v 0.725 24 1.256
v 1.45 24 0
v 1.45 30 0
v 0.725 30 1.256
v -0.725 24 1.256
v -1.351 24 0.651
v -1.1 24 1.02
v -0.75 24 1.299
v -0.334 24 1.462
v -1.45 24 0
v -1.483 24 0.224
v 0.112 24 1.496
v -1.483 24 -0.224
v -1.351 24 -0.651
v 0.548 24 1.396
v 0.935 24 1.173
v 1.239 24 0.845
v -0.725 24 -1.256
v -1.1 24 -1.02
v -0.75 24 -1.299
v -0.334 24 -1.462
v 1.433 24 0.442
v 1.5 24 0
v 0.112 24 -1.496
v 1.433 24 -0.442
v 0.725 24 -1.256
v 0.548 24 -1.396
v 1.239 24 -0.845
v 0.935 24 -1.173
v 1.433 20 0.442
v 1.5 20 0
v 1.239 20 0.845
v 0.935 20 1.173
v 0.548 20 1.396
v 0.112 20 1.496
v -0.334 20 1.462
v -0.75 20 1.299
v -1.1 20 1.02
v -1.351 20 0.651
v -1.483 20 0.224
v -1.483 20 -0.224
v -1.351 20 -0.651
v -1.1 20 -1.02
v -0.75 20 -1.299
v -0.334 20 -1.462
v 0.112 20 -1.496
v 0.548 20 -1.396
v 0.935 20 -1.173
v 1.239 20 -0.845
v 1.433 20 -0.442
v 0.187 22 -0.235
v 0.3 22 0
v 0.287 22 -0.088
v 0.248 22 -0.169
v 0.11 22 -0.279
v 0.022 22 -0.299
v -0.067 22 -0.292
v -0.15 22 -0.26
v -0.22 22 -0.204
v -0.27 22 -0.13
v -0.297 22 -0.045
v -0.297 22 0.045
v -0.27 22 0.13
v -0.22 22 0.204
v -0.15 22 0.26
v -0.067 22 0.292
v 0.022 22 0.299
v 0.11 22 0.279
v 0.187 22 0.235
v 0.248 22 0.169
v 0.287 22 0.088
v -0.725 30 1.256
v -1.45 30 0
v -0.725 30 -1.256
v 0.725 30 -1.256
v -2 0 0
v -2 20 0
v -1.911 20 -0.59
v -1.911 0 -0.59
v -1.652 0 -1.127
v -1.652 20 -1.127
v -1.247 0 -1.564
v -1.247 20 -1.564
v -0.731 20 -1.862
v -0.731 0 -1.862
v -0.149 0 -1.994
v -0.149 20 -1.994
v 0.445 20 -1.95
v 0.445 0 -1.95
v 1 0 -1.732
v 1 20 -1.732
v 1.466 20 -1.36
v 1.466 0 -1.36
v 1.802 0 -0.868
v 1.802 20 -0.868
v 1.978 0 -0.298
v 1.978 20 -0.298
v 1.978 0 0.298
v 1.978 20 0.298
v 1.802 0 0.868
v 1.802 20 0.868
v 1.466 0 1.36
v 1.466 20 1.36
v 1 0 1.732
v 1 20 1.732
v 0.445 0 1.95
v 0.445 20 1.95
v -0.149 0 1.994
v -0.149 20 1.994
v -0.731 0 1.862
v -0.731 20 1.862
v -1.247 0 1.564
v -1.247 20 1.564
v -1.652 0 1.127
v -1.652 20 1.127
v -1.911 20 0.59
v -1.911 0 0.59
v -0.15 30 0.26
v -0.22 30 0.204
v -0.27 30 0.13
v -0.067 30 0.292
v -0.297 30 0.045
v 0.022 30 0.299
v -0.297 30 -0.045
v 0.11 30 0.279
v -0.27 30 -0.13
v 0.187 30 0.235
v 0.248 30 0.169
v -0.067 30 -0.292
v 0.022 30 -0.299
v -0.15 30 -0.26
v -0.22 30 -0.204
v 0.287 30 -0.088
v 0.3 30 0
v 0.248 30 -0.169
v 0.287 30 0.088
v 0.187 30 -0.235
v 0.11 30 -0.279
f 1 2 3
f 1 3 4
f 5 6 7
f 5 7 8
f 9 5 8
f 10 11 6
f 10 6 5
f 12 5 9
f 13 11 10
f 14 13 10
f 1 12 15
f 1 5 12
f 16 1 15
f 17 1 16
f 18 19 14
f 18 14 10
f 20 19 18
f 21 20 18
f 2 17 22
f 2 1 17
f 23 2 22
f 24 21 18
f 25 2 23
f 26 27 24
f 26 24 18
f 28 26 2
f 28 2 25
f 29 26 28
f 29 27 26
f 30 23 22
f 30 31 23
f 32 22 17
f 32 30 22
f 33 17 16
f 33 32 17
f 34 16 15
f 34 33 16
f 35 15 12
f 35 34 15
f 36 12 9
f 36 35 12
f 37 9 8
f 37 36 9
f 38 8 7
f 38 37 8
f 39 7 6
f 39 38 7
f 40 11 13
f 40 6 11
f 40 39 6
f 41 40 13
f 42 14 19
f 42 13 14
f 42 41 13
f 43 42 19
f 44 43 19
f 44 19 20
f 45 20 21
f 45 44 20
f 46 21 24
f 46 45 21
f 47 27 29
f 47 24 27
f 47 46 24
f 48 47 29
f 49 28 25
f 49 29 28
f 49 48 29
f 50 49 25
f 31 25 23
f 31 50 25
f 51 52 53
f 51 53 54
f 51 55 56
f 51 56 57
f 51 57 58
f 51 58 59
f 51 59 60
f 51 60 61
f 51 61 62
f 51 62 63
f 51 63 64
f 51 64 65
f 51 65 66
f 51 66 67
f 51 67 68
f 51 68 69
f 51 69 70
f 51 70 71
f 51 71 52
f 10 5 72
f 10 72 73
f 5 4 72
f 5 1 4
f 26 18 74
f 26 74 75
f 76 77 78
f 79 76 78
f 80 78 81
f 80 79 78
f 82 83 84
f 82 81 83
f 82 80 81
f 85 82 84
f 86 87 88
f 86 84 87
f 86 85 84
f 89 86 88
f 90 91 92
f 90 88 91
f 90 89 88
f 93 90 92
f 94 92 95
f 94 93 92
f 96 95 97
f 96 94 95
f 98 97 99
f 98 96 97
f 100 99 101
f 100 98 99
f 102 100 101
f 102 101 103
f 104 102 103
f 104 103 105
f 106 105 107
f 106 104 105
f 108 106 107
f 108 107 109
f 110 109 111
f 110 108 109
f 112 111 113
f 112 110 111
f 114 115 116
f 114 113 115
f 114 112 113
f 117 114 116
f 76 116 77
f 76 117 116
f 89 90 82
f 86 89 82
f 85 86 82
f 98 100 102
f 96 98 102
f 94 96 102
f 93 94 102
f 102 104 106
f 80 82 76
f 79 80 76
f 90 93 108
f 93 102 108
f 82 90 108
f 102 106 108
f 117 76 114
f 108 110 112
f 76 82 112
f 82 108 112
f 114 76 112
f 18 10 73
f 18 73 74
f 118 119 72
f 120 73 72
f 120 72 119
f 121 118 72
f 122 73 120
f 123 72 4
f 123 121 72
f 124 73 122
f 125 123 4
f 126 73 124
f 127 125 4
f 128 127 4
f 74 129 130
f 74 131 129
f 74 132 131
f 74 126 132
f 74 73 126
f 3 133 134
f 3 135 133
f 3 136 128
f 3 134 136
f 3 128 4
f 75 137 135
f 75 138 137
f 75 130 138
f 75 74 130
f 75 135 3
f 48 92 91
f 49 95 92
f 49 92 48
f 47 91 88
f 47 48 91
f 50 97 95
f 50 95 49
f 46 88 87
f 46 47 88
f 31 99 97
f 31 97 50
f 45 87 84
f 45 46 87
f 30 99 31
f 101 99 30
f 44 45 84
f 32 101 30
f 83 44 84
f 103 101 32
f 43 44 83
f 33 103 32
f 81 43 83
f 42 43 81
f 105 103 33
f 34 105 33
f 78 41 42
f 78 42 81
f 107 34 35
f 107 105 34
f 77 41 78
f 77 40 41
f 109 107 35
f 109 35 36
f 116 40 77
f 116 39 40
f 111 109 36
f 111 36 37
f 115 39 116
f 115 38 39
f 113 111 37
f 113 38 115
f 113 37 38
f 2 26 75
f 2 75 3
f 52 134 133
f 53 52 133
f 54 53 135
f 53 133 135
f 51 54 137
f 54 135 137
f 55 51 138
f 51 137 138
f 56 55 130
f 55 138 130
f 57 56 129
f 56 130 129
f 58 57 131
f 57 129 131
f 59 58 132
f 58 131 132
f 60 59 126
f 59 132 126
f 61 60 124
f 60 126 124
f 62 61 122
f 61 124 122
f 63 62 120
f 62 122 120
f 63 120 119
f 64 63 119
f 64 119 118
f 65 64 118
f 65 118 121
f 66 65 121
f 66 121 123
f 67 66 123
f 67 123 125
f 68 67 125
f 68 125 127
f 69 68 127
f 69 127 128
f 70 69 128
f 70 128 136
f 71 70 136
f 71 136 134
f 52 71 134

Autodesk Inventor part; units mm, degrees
ref_plane "YZ Plane" through (0, 0, 0) normal (1, 0, 0) x (0, 1, 0)
ref_plane "XZ Plane" through (0, 0, 0) normal (0, 1, 0) x (-1, 0, 0)
ref_plane "XY Plane" through (0, 0, 0) normal (0, 0, 1) x (1, 0, 0)
sketch "Sketch1" plane through (0, 0, 0) normal (0, 1, 0) x (-1, 0, 0)
  circle A0 centre (0, 0) radius 2
  dimension "d0" = 4
extrude "Extrusion1" add sketch "Sketch1" along normal blind 20
sketch "Sketch2" plane through (0, 20, 0) normal (0, 1, 0) x (1, 0, 0)
  circle A0 centre (0, 0) radius 1.5
  dimension "d3" = 3
extrude "Extrusion2" add sketch "Sketch2" along normal blind 4
sketch "Sketch3" plane through (0, 24, 0) normal (0, 1, 0) x (1, 0, 0)
  line L0 (-1.4497, 0) -> (-0.7249, 1.2555)
  line L1 (-0.7249, 1.2555) -> (0.7249, 1.2555)
  line L2 (0.7249, 1.2555) -> (1.4497, 0)
  line L3 (1.4497, 0) -> (0.7249, -1.2555)
  line L4 (0.7249, -1.2555) -> (-0.7249, -1.2555)
  line L5 (-0.7249, -1.2555) -> (-1.4497, 0)
  point P0 (0, 0)
  point P1 (0, 0)
  dimension "d6" = 2.511
extrude "Extrusion3" add sketch "Sketch3" along normal blind 6
sketch "Sketch4" plane through (0, 30, 0) normal (0, 1, 0) x (1, 0, 0)
  circle A0 centre (0, 0) radius 0.3
  dimension "d9" = 0.6
extrude "Extrusion4" cut sketch "Sketch4" against normal blind 8
properties part number "39-10-202-A2"
